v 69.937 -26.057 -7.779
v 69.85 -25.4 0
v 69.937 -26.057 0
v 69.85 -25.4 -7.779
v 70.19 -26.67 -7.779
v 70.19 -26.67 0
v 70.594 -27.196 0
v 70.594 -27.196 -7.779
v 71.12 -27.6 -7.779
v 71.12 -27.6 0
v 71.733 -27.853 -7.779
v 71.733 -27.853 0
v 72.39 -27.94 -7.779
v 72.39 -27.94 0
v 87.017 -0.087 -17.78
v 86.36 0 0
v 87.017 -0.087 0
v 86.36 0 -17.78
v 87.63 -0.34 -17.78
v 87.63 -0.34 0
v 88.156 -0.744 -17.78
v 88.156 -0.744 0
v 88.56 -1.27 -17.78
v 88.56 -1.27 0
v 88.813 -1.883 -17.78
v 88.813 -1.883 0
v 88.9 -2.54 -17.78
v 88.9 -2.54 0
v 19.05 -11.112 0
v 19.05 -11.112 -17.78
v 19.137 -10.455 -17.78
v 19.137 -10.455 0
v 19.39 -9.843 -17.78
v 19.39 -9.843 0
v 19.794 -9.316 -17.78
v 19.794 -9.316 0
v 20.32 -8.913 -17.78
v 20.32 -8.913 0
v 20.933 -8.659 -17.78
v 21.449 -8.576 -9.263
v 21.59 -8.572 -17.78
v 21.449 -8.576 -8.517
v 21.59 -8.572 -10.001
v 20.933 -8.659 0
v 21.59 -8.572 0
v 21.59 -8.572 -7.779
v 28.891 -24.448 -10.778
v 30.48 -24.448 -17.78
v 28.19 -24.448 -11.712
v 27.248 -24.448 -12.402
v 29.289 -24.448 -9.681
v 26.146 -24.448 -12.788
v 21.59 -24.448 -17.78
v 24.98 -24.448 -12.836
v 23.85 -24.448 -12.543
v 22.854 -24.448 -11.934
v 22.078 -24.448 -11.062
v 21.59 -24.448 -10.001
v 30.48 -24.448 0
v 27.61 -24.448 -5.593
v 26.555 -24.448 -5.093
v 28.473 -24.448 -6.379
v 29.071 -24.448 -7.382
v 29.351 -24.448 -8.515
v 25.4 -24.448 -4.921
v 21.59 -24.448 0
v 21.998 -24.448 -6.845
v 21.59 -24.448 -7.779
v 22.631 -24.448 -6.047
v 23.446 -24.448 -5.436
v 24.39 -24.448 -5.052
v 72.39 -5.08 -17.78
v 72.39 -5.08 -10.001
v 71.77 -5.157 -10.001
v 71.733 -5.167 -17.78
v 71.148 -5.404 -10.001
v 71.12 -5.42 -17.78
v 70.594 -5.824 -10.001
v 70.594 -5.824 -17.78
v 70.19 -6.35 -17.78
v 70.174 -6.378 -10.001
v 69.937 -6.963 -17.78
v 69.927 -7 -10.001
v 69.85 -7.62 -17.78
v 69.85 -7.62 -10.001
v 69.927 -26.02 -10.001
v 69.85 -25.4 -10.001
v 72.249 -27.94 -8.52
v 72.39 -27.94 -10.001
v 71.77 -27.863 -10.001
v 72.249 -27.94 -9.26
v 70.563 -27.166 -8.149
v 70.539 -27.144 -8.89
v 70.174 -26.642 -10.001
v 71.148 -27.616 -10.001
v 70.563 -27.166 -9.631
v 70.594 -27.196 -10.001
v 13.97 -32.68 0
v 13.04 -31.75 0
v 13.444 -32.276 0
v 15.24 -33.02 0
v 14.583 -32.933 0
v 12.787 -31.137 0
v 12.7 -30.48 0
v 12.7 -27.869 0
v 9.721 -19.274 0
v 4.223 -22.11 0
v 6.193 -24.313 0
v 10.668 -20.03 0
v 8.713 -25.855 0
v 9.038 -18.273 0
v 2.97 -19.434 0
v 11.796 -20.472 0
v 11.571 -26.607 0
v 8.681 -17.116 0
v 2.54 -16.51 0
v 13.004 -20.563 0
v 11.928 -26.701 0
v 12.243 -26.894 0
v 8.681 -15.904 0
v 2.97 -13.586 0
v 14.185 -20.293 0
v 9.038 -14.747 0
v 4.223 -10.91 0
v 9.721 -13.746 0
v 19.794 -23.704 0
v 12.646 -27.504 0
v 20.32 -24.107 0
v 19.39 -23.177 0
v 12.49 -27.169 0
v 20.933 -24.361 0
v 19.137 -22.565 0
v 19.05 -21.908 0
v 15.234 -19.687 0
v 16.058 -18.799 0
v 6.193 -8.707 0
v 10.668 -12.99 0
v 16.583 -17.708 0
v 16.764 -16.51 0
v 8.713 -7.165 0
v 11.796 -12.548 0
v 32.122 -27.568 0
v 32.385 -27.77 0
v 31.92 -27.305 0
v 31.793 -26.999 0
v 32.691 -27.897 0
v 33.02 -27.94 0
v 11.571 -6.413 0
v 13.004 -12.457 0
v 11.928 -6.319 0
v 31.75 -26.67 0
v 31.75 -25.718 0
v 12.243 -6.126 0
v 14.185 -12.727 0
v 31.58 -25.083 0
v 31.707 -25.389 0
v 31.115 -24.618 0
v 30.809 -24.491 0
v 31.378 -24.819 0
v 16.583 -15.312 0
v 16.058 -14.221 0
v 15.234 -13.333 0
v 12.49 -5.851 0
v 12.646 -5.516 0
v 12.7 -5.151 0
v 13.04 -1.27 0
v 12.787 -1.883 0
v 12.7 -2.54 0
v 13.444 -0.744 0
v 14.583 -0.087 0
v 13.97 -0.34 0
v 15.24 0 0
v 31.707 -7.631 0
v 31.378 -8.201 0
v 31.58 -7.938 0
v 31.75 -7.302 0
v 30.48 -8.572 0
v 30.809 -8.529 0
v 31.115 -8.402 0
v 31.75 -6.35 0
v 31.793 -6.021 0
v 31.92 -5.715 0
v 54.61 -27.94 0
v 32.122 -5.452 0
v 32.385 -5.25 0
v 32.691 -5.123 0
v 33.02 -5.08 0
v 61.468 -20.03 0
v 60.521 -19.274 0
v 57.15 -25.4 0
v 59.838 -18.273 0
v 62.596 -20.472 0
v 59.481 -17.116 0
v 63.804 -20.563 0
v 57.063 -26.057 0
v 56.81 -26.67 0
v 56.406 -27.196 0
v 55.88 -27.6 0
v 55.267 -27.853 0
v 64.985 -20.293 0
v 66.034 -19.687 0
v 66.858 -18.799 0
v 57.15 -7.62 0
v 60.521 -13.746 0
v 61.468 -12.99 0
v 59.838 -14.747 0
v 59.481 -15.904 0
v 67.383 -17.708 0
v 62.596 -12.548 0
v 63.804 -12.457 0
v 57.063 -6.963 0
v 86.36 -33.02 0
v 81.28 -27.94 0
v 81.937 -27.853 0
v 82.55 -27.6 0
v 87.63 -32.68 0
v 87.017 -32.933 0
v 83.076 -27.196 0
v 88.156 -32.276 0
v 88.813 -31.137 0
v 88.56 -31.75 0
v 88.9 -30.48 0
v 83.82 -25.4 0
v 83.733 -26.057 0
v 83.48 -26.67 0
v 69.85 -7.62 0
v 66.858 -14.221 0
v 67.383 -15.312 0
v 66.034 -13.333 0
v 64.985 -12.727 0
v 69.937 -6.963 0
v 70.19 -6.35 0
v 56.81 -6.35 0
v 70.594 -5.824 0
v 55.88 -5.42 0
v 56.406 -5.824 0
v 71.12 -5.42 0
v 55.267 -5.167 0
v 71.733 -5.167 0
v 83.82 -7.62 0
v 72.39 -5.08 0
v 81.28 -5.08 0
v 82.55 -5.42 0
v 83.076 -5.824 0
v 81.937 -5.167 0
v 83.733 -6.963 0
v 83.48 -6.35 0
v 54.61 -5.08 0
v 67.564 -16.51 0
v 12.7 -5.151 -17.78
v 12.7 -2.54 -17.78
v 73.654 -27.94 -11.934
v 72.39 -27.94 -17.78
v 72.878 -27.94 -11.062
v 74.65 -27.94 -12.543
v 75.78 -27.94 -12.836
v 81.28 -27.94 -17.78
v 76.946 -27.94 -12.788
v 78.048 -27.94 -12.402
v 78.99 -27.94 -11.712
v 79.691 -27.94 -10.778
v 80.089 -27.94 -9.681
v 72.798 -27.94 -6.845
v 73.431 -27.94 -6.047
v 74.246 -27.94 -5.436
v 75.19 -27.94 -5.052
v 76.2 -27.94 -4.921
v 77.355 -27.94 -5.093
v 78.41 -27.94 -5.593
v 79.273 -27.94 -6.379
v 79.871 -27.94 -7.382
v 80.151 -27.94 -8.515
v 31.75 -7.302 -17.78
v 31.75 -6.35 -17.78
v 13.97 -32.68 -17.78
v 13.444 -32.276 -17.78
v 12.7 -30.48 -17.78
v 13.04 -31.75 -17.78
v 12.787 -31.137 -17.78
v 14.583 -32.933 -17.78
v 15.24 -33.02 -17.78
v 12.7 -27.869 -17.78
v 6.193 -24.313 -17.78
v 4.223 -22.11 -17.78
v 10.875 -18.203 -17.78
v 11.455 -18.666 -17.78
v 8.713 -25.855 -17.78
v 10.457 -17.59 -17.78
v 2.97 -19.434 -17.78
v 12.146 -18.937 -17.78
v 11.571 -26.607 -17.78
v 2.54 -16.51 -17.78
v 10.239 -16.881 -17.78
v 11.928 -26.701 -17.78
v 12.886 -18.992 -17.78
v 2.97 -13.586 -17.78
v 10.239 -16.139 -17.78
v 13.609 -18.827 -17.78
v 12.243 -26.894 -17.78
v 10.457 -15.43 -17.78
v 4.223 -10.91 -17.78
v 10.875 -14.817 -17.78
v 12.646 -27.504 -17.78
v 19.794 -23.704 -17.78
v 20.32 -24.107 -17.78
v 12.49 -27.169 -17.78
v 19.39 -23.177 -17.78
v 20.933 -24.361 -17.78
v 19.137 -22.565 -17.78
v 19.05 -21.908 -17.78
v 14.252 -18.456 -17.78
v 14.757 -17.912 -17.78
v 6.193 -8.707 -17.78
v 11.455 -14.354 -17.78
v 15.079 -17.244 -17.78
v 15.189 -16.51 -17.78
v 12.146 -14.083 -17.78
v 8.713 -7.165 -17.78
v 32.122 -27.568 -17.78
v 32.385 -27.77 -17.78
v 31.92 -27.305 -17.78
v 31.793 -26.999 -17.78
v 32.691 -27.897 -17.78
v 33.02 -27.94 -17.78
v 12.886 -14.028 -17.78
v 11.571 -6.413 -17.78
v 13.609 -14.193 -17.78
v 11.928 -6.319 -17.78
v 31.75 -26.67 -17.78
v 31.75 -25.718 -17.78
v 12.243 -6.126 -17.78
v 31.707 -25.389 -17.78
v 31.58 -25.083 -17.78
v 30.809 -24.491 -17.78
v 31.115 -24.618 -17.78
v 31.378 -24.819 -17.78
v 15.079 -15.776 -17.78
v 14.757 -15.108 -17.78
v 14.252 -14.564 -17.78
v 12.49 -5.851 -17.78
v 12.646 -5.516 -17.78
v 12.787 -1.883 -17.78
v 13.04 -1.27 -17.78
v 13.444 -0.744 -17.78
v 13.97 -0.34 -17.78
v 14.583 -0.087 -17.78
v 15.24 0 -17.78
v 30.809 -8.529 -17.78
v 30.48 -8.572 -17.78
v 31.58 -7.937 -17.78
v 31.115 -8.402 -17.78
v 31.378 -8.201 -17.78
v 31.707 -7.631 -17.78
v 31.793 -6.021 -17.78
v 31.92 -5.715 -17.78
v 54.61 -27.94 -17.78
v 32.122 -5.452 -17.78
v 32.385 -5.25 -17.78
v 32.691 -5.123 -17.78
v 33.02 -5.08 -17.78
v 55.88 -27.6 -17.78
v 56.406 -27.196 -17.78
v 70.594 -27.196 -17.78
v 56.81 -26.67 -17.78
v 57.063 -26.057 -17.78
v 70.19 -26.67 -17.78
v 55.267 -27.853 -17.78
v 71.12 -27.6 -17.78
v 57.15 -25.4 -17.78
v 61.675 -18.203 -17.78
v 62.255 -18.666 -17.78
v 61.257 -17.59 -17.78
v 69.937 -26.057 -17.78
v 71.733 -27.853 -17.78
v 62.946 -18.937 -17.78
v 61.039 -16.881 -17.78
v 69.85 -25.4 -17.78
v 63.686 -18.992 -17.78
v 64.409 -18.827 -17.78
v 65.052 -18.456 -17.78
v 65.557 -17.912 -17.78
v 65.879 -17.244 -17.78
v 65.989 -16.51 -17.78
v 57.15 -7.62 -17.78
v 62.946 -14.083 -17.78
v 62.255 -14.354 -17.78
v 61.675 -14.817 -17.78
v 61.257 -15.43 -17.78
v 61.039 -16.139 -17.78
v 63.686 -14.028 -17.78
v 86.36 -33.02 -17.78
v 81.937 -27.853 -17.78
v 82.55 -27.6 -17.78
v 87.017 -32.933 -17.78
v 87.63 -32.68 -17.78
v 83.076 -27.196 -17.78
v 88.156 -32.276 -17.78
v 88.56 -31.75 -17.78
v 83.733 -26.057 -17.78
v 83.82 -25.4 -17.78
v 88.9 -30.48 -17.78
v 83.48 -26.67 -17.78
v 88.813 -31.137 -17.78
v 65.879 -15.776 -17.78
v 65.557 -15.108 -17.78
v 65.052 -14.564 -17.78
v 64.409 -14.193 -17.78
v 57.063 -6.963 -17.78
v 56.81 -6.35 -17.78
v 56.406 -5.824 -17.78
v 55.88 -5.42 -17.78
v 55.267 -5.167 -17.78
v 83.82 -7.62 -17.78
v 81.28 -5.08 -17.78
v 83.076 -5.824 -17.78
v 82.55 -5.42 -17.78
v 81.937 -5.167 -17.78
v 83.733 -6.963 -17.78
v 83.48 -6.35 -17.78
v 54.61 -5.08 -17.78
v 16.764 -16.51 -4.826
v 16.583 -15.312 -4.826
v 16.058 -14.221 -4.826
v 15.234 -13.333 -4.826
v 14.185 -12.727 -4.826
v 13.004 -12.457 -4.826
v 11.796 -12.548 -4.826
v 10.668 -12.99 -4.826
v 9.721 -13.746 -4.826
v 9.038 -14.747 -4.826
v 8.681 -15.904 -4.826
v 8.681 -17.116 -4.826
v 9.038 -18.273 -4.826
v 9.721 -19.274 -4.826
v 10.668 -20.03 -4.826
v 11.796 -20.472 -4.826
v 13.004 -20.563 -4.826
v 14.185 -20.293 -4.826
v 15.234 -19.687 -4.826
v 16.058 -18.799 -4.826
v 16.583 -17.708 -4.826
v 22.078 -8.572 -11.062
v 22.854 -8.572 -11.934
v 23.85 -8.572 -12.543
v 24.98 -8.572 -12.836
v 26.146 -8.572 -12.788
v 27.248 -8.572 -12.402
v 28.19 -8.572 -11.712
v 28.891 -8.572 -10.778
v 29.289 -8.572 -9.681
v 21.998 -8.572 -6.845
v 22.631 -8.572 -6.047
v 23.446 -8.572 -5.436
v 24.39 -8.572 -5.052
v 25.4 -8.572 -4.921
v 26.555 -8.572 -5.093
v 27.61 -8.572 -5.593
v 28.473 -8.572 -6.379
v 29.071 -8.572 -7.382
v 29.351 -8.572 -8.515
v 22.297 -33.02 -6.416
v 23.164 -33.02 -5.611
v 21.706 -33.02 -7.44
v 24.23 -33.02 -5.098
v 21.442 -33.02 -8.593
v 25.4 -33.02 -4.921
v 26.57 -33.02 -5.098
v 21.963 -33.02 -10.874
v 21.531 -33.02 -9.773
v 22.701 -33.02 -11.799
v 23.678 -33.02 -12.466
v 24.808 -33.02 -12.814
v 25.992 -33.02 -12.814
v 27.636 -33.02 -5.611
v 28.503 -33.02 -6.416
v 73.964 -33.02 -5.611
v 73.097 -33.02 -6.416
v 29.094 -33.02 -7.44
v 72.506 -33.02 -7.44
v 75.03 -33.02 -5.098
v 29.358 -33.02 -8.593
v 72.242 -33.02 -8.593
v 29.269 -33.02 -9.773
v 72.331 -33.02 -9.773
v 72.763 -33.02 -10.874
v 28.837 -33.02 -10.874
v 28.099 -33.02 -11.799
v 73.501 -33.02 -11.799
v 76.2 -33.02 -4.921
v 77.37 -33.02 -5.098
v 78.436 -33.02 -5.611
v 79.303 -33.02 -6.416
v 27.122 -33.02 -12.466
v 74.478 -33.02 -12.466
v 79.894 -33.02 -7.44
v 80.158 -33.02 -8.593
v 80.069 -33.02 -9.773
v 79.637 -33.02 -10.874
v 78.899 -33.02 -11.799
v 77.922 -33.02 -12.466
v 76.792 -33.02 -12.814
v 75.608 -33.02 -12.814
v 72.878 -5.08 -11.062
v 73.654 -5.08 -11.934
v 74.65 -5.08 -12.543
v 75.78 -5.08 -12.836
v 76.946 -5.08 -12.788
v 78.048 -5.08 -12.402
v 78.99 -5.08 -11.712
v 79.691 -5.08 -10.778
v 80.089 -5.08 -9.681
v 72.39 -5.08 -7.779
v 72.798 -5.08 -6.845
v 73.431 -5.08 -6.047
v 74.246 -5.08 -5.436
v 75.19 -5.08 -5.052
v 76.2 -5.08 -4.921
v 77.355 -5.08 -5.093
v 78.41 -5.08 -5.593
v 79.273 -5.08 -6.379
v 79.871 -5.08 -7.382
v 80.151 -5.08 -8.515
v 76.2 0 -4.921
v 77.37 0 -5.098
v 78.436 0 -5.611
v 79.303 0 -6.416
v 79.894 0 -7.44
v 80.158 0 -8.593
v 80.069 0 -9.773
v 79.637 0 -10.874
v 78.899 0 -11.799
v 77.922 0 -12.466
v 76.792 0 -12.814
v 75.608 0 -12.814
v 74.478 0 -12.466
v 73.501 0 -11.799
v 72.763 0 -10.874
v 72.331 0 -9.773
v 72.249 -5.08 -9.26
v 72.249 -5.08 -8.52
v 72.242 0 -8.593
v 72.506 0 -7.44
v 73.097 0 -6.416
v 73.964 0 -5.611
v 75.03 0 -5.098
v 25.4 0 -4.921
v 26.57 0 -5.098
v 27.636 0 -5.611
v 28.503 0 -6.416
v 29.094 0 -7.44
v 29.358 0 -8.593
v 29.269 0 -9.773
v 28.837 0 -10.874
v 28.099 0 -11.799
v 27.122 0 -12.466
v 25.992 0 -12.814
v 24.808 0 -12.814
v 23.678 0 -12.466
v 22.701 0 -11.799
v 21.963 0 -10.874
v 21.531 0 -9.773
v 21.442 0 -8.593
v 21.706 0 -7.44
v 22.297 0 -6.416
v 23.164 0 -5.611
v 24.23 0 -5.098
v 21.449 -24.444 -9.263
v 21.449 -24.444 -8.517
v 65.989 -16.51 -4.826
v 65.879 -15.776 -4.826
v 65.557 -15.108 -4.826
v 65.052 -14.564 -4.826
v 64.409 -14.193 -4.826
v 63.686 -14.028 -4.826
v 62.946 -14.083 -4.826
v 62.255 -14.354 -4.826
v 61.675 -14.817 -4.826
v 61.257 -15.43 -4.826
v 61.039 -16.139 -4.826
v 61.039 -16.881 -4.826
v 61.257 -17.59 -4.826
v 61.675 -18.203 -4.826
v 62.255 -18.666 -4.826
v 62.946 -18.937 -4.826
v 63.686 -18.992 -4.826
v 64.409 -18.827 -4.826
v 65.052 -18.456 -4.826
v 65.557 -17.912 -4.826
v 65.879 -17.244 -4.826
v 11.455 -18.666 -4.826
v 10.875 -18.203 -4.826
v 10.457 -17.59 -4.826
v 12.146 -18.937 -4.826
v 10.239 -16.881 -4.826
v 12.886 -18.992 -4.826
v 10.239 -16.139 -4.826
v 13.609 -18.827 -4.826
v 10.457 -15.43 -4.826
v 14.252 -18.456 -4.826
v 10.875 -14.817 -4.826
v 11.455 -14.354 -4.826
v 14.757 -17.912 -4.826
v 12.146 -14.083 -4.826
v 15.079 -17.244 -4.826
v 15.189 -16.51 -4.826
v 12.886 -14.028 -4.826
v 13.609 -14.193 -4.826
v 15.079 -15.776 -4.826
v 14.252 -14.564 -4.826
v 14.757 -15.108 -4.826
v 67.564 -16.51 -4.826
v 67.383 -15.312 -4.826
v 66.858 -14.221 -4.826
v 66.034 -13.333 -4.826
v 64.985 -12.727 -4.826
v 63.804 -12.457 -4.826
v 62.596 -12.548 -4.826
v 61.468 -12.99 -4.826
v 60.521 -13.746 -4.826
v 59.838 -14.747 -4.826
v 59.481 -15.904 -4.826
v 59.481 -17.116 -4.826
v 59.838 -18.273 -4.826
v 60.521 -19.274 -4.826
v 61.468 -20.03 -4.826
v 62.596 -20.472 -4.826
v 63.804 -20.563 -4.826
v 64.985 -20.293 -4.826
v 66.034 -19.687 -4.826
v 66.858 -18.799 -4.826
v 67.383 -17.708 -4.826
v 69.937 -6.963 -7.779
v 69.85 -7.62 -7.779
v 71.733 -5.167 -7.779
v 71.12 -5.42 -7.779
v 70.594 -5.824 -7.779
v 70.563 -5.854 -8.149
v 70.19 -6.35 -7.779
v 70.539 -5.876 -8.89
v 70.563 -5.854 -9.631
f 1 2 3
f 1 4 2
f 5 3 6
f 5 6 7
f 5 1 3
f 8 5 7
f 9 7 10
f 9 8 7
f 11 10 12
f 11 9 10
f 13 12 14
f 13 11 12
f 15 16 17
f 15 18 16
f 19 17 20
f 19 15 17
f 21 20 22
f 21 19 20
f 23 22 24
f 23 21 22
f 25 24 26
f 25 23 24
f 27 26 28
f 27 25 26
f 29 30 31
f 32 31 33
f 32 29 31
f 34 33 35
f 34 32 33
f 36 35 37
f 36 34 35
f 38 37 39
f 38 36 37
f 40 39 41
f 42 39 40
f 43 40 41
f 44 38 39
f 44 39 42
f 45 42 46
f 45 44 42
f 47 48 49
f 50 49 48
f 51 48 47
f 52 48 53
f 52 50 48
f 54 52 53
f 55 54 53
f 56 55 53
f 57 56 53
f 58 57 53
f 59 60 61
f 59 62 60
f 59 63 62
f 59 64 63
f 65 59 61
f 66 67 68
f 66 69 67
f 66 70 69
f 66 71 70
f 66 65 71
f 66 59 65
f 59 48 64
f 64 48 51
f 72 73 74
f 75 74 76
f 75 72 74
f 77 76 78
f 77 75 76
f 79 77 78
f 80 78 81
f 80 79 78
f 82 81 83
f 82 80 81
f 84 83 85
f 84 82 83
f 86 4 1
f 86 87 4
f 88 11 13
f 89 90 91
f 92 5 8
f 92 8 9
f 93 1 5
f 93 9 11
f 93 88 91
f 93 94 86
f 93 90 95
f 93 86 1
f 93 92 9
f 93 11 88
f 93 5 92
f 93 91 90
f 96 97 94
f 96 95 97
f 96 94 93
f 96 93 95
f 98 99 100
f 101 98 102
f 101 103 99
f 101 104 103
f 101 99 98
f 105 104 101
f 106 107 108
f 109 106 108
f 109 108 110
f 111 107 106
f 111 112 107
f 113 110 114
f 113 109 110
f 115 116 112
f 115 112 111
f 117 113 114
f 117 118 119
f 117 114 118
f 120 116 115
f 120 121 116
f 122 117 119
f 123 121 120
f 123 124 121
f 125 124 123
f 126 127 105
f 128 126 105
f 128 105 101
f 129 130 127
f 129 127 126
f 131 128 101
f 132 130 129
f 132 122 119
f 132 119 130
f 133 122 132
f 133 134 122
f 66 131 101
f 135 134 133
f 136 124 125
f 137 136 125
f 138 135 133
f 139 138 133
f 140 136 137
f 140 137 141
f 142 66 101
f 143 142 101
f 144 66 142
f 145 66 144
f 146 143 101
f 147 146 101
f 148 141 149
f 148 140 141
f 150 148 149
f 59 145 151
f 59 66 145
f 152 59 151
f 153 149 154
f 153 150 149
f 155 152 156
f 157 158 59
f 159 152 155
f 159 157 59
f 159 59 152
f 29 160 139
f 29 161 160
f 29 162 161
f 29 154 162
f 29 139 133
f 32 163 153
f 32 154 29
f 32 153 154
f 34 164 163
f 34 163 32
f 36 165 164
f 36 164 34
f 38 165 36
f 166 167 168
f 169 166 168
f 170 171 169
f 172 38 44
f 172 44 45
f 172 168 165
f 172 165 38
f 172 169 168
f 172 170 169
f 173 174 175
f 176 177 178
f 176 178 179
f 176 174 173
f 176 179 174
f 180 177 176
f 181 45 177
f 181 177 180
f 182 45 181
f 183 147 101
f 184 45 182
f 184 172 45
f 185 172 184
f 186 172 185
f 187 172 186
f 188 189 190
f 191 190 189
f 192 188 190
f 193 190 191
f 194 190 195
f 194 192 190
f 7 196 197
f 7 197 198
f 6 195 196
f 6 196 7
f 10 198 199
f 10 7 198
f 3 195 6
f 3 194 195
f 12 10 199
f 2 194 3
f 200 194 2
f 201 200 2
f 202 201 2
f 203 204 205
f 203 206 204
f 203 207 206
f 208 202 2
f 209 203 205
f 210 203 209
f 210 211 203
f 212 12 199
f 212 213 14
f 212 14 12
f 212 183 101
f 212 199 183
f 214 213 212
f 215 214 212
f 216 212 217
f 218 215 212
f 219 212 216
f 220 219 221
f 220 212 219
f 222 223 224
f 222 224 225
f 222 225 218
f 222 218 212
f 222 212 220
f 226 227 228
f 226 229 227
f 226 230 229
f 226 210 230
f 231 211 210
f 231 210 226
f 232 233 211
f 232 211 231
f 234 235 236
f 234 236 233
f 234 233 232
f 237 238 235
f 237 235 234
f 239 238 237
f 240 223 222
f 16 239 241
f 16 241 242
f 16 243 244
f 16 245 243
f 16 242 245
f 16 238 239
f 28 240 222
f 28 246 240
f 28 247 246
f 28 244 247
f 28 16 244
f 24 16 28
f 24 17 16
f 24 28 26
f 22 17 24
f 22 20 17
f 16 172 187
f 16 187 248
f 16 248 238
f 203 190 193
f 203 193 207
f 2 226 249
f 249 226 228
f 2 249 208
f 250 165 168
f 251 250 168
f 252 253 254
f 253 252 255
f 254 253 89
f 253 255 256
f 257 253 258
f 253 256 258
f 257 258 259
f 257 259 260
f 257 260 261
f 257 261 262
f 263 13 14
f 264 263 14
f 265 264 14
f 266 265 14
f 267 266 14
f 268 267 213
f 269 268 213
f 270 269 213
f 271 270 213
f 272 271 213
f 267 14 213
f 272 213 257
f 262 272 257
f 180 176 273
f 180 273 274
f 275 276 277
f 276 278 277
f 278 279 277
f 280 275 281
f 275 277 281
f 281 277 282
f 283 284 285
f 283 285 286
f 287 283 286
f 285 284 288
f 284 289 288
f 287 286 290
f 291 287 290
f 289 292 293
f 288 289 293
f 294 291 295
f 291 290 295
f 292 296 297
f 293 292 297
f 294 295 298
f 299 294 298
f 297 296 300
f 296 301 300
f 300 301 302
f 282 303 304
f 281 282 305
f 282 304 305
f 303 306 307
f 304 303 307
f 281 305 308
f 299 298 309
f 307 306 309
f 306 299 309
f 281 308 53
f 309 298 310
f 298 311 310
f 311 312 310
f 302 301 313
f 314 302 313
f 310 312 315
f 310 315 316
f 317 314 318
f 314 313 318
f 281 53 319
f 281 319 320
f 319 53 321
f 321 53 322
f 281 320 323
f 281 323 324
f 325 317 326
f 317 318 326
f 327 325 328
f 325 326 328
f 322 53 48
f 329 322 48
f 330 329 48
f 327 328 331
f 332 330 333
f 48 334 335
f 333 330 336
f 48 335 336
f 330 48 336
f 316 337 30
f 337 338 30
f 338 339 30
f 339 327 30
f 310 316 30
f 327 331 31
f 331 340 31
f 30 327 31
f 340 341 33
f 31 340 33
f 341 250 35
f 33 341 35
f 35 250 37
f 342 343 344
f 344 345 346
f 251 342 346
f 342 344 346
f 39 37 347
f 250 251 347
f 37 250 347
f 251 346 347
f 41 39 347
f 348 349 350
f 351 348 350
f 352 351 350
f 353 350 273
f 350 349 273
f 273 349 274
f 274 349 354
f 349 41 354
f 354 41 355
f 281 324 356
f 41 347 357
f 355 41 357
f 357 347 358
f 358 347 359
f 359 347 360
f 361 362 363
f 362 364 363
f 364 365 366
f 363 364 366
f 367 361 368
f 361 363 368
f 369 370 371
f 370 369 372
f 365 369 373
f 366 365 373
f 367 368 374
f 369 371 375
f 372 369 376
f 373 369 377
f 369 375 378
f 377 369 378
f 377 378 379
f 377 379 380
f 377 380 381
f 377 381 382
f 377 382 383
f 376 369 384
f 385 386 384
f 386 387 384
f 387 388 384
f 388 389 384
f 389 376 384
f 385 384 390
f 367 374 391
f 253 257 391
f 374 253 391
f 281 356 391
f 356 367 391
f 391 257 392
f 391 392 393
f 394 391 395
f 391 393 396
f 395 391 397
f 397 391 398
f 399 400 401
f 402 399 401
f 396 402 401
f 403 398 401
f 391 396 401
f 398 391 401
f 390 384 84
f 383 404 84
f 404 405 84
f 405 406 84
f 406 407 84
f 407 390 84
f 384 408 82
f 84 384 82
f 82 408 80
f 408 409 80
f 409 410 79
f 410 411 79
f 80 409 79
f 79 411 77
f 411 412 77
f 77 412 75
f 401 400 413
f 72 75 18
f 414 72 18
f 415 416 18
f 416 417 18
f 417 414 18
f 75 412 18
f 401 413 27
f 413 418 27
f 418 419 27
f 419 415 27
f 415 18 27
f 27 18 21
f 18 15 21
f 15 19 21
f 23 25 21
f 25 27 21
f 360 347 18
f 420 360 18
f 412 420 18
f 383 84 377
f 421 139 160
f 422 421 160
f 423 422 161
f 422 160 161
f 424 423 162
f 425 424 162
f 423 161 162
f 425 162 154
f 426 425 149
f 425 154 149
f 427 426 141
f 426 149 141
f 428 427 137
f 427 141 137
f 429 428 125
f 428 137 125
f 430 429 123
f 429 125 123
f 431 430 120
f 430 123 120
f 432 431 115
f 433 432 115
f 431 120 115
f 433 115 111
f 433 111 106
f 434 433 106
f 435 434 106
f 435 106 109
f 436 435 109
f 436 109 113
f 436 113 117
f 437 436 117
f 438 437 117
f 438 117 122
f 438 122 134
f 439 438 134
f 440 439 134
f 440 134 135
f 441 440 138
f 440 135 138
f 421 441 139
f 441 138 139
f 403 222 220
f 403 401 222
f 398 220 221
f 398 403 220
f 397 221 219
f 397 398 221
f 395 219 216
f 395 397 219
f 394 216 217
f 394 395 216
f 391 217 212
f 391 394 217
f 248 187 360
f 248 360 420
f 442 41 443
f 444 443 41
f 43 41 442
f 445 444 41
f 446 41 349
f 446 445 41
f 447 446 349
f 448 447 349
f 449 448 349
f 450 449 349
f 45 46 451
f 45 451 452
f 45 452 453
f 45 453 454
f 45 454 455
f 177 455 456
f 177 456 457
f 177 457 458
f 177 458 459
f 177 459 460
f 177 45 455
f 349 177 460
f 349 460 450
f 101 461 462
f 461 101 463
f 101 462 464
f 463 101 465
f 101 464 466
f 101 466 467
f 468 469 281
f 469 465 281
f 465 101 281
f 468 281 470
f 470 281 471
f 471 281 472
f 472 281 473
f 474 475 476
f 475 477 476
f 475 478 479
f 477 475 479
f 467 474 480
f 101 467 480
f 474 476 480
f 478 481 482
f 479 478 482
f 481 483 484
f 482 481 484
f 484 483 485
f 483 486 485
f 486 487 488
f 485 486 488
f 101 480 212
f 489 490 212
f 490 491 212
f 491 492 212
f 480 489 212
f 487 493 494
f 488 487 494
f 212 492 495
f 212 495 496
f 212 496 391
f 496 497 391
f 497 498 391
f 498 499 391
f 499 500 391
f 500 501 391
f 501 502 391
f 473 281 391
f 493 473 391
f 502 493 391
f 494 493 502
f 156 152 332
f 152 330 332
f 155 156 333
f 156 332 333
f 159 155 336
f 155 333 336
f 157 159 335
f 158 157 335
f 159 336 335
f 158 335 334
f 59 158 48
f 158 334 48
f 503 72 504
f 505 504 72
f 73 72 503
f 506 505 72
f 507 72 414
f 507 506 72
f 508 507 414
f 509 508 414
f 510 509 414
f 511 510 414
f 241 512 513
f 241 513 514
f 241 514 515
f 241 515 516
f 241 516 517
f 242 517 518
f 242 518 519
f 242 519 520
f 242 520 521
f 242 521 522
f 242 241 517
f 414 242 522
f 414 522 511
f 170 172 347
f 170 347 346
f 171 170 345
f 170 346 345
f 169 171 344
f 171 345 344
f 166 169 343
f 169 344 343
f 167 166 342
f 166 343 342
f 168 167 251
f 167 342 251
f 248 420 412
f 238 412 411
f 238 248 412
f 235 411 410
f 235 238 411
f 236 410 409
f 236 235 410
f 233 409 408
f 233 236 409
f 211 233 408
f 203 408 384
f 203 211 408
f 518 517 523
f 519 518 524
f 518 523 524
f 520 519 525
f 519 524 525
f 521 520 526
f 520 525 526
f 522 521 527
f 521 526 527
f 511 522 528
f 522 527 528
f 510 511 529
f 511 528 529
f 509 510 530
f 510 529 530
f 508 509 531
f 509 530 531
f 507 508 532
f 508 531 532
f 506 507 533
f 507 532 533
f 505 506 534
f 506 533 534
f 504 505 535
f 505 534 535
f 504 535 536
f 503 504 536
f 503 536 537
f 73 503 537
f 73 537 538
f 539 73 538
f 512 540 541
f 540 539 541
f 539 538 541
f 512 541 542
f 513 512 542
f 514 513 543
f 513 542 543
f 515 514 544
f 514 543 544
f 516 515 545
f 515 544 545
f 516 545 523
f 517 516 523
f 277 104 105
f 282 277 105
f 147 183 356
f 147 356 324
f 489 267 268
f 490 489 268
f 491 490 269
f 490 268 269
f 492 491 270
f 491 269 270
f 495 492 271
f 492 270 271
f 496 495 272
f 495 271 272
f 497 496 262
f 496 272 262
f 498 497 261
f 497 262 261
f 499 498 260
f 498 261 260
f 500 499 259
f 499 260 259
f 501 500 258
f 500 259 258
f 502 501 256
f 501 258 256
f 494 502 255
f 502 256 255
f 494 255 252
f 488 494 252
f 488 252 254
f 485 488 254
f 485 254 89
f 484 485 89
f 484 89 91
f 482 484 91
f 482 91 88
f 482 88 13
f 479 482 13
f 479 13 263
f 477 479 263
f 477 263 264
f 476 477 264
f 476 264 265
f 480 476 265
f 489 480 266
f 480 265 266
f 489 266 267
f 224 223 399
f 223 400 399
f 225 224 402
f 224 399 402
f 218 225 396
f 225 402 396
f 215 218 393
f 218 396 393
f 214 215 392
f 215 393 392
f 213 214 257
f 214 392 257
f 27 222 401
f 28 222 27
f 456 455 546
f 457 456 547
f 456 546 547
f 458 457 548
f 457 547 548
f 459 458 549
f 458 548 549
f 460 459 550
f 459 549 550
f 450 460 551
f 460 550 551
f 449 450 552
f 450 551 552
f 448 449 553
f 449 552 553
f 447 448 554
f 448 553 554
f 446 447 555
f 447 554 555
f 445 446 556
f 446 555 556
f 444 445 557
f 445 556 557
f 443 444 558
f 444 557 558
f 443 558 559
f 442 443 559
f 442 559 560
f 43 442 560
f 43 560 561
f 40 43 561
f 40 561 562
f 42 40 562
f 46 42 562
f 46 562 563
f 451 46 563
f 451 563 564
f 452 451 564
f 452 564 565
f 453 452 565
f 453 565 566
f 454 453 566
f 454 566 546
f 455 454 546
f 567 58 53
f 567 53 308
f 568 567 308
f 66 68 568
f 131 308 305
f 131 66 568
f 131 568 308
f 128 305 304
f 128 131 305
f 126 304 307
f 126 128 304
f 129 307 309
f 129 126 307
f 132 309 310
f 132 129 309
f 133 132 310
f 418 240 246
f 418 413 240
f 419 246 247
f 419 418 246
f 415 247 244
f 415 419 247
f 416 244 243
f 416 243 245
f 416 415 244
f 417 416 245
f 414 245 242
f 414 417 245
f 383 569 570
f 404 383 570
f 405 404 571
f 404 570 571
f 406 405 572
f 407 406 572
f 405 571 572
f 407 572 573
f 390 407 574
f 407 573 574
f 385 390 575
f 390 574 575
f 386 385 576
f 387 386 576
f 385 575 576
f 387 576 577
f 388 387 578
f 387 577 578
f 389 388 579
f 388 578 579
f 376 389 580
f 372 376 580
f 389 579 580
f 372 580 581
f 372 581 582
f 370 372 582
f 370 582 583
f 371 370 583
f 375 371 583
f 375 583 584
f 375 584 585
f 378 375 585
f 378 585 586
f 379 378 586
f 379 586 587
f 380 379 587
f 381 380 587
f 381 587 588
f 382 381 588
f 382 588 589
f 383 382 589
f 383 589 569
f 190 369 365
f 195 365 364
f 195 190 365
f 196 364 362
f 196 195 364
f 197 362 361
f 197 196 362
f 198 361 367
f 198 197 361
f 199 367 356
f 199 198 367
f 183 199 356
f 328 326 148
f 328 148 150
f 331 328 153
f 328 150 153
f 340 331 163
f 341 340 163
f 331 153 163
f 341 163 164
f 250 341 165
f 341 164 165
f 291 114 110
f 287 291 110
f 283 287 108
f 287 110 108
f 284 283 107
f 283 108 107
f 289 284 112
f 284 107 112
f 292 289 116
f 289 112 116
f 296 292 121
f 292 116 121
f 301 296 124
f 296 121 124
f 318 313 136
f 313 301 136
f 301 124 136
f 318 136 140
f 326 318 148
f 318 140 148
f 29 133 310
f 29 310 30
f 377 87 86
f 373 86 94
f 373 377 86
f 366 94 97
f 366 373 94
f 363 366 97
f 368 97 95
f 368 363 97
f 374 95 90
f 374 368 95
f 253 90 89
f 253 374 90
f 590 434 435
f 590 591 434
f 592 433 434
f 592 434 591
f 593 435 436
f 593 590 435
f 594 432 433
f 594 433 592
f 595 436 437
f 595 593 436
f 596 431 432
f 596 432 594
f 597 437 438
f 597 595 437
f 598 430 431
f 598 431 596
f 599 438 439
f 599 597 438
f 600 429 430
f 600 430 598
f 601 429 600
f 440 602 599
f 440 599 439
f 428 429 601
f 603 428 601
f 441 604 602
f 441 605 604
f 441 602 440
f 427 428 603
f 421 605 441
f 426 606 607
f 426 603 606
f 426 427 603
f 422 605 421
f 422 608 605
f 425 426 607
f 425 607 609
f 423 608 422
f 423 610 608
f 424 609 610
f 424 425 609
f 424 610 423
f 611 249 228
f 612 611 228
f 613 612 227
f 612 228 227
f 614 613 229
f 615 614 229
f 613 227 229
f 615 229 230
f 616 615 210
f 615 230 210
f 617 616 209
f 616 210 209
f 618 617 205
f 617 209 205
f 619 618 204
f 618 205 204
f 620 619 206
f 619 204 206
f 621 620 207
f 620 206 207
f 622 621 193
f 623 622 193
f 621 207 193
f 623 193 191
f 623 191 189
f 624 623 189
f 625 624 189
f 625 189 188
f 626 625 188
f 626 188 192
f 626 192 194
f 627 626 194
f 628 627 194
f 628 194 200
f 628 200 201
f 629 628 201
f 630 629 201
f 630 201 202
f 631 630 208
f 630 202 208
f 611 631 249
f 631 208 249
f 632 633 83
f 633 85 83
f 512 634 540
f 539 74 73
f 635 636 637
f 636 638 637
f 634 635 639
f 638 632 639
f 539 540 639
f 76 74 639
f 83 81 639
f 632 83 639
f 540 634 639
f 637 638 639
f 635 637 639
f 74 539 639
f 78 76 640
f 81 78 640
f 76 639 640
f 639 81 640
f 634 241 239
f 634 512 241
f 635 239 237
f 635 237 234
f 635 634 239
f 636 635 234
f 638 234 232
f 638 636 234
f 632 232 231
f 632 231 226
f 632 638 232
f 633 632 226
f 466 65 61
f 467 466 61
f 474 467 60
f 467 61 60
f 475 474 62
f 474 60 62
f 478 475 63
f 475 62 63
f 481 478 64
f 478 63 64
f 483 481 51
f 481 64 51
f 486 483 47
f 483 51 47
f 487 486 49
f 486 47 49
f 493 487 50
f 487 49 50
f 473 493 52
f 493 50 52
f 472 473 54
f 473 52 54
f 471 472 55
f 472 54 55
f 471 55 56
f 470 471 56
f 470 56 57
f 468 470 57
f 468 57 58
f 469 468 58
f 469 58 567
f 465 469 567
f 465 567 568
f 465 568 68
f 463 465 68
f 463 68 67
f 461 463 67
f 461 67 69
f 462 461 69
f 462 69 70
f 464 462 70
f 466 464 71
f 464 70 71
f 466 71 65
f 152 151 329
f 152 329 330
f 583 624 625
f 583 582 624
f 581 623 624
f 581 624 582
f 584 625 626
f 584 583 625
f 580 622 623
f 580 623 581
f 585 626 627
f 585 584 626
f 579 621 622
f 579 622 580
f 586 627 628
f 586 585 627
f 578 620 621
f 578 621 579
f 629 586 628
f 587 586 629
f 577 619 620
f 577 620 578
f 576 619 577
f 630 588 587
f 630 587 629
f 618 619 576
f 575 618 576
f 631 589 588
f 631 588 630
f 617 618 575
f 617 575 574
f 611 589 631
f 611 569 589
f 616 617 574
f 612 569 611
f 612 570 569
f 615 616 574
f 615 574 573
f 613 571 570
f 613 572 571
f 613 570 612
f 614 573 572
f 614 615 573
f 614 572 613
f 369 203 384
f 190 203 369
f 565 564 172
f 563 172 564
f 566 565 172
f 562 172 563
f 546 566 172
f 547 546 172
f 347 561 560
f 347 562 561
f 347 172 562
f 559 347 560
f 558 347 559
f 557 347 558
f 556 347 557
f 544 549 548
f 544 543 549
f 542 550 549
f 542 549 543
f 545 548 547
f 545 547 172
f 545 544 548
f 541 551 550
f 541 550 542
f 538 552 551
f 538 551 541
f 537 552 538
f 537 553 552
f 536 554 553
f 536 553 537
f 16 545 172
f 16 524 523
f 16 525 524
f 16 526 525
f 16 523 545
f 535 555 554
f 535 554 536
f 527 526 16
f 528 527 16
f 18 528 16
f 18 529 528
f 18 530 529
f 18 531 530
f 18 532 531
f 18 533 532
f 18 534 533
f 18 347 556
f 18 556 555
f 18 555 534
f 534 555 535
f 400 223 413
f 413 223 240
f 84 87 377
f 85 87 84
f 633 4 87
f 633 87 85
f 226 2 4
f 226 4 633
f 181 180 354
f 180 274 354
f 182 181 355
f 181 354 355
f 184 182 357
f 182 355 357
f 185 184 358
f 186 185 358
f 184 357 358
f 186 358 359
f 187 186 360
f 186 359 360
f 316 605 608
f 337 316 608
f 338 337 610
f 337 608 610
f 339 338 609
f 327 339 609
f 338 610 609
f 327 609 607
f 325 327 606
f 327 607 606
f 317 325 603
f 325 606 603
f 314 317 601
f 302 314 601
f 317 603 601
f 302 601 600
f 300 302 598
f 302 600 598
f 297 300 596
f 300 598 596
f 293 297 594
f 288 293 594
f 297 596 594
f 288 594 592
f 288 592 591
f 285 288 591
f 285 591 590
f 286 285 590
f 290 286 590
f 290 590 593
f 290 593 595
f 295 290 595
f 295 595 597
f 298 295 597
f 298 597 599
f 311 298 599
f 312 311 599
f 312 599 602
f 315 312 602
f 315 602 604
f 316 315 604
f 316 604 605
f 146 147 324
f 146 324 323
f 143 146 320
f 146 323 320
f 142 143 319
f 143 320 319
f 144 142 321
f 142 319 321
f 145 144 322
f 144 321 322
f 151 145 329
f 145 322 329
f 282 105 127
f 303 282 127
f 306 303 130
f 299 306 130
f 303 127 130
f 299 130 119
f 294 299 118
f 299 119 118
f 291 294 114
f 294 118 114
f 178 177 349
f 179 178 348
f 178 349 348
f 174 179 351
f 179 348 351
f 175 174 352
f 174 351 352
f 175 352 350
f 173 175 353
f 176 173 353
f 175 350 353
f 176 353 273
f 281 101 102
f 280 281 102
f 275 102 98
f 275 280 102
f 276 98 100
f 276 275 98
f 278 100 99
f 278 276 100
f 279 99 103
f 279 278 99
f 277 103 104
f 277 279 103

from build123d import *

# Parameters (mm, degrees)
SKETCH1_W           = 101.6
SKETCH1_H           = 17.78
SKETCH1_R           = 3.96875
BOSS_EXTRUDE1_DEPTH = 33.02
SKETCH2_R           = 2.4892
CUT_EXTRUDE1_DEPTH  = 17.78
SKETCH3_R           = 4.064
CUT_EXTRUDE2_DEPTH  = 4.826
CUT_EXTRUDE3_DEPTH  = 109.300548475
FILLET1_R           = 2.54
SKETCH6_W           = 13.97
SKETCH6_H           = 22.86
SKETCH6_W_2         = 10.94852006
SKETCH6_H_2         = 22.718450652
CUT_EXTRUDE4_DEPTH  = 106.921350067
FILLET2_R           = 2.54
FILLET3_R           = 1.27


with BuildPart() as part:
    # Sketch1 → Boss-Extrude1 (new body)
    with BuildSketch(Plane(origin=(0, 0, 0), x_dir=(1, 0, 0), z_dir=(0, 1, 0))):
        with Locations((50.8, 8.89)):
            Rectangle(SKETCH1_W, SKETCH1_H)
        with Locations(Location((76.2, 8.89, 0), (0, 0, 270))):
            Circle(SKETCH1_R, mode=Mode.SUBTRACT)
        with Locations(Location((25.4, 8.89, 0), (0, 0, 270))):
            Circle(SKETCH1_R, mode=Mode.SUBTRACT)
    extrude(amount=-BOSS_EXTRUDE1_DEPTH)

    # Sketch2 → Cut-Extrude1 (cut)
    with BuildSketch(Plane.XY):
        with Locations((63.5, -16.51)):
            Circle(SKETCH2_R)
        with Locations((12.7, -16.51)):
            Circle(SKETCH2_R)
    extrude(amount=-CUT_EXTRUDE1_DEPTH, mode=Mode.SUBTRACT)

    # Sketch3 → Cut-Extrude2 (cut)
    with BuildSketch(Plane.XY):
        with Locations((63.5, -16.51)):
            Circle(SKETCH3_R)
        with Locations((12.7, -16.51)):
            Circle(SKETCH3_R)
    extrude(amount=-CUT_EXTRUDE2_DEPTH, mode=Mode.SUBTRACT)

    # Sketch5 → Cut-Extrude3 (cut, through all)
    with BuildSketch(Plane.XY):
        with BuildLine():
            Line((12.7, -5.150774674), (12.7, 0))
            Line((12.7, 0), (0, 0))
            Line((0, 0), (0, -33.02))
            Line((0, -33.02), (12.7, -33.02))
            Line((12.7, -33.02), (12.7, -27.869225326))
            ThreePointArc((12.7, -27.869225326), (12.37660211, -27.022558659), (11.571111111, -26.607089178))
            ThreePointArc((11.571111111, -26.607089178), (2.54, -16.51), (11.571111111, -6.412910822))
            ThreePointArc((11.571111111, -6.412910822), (12.37660211, -5.997441341), (12.7, -5.150774674))
        make_face()
        with BuildLine():
            Line((88.9, -5.150774674), (88.9, 0))
            Line((88.9, 0), (101.6, 0))
            Line((101.6, 0), (101.6, -33.02))
            Line((101.6, -33.02), (88.9, -33.02))
            Line((88.9, -33.02), (88.9, -27.869225326))
            ThreePointArc((88.9, -27.869225326), (89.22339789, -27.022558659), (90.028888889, -26.607089178))
            ThreePointArc((90.028888889, -26.607089178), (99.06, -16.51), (90.028888889, -6.412910822))
            ThreePointArc((90.028888889, -6.412910822), (89.22339789, -5.997441341), (88.9, -5.150774674))
        make_face()
    extrude(amount=-CUT_EXTRUDE3_DEPTH, mode=Mode.SUBTRACT)

    # Fillet1
    fillet1_edges = [part.edges().sort_by_distance(p)[0] for p in [
        (12.7, -33.02, -8.89),
        (12.7, 0, -8.89),
        (88.9, 0, -8.89),
        (88.9, -33.02, -8.89),
    ]]
    fillet(fillet1_edges, radius=FILLET1_R)

    # Sketch6 → Cut-Extrude4 (cut, through all)
    with BuildSketch(Plane.XY):
        with BuildLine():
            Line((19.05, -21.9075), (19.05, -11.1125))
            ThreePointArc((19.05, -11.1125), (19.793948776, -9.316448776), (21.59, -8.5725))
            Line((21.59, -8.5725), (31.75, -8.5725))
            Line((31.75, -8.5725), (31.75, -5.08))
            Line((31.75, -5.08), (54.61, -5.08))
            ThreePointArc((54.61, -5.08), (56.406051224, -5.823948776), (57.15, -7.62))
            Line((57.15, -7.62), (57.15, -25.4))
            ThreePointArc((57.15, -25.4), (56.406051224, -27.196051224), (54.61, -27.94))
            Line((54.61, -27.94), (31.75, -27.94))
            Line((31.75, -27.94), (31.75, -24.4475))
            Line((31.75, -24.4475), (21.59, -24.4475))
            ThreePointArc((21.59, -24.4475), (19.793948776, -23.703551224), (19.05, -21.9075))
        make_face()
        with Locations((76.835, -16.51)):
            Rectangle(SKETCH6_W, SKETCH6_H)
        with Locations((94.37426003, -16.51)):
            Rectangle(SKETCH6_W_2, SKETCH6_H_2)
    extrude(amount=-CUT_EXTRUDE4_DEPTH, mode=Mode.SUBTRACT)

    # Fillet2
    fillet2_edges = [part.edges().sort_by_distance(p)[0] for p in [
        (69.85, -5.08, -8.89),
        (83.82, -27.94, -8.89),
        (83.82, -5.08, -8.89),
        (69.85, -27.94, -8.89),
    ]]
    fillet(fillet2_edges, radius=FILLET2_R)

    # Fillet3
    fillet3_edges = [part.edges().sort_by_distance(p)[0] for p in [
        (31.75, -24.4475, -8.89),
        (31.75, -8.5725, -8.89),
        (31.75, -5.08, -8.89),
        (31.75, -27.94, -8.89),
    ]]
    fillet(fillet3_edges, radius=FILLET3_R)


solid = part.part
